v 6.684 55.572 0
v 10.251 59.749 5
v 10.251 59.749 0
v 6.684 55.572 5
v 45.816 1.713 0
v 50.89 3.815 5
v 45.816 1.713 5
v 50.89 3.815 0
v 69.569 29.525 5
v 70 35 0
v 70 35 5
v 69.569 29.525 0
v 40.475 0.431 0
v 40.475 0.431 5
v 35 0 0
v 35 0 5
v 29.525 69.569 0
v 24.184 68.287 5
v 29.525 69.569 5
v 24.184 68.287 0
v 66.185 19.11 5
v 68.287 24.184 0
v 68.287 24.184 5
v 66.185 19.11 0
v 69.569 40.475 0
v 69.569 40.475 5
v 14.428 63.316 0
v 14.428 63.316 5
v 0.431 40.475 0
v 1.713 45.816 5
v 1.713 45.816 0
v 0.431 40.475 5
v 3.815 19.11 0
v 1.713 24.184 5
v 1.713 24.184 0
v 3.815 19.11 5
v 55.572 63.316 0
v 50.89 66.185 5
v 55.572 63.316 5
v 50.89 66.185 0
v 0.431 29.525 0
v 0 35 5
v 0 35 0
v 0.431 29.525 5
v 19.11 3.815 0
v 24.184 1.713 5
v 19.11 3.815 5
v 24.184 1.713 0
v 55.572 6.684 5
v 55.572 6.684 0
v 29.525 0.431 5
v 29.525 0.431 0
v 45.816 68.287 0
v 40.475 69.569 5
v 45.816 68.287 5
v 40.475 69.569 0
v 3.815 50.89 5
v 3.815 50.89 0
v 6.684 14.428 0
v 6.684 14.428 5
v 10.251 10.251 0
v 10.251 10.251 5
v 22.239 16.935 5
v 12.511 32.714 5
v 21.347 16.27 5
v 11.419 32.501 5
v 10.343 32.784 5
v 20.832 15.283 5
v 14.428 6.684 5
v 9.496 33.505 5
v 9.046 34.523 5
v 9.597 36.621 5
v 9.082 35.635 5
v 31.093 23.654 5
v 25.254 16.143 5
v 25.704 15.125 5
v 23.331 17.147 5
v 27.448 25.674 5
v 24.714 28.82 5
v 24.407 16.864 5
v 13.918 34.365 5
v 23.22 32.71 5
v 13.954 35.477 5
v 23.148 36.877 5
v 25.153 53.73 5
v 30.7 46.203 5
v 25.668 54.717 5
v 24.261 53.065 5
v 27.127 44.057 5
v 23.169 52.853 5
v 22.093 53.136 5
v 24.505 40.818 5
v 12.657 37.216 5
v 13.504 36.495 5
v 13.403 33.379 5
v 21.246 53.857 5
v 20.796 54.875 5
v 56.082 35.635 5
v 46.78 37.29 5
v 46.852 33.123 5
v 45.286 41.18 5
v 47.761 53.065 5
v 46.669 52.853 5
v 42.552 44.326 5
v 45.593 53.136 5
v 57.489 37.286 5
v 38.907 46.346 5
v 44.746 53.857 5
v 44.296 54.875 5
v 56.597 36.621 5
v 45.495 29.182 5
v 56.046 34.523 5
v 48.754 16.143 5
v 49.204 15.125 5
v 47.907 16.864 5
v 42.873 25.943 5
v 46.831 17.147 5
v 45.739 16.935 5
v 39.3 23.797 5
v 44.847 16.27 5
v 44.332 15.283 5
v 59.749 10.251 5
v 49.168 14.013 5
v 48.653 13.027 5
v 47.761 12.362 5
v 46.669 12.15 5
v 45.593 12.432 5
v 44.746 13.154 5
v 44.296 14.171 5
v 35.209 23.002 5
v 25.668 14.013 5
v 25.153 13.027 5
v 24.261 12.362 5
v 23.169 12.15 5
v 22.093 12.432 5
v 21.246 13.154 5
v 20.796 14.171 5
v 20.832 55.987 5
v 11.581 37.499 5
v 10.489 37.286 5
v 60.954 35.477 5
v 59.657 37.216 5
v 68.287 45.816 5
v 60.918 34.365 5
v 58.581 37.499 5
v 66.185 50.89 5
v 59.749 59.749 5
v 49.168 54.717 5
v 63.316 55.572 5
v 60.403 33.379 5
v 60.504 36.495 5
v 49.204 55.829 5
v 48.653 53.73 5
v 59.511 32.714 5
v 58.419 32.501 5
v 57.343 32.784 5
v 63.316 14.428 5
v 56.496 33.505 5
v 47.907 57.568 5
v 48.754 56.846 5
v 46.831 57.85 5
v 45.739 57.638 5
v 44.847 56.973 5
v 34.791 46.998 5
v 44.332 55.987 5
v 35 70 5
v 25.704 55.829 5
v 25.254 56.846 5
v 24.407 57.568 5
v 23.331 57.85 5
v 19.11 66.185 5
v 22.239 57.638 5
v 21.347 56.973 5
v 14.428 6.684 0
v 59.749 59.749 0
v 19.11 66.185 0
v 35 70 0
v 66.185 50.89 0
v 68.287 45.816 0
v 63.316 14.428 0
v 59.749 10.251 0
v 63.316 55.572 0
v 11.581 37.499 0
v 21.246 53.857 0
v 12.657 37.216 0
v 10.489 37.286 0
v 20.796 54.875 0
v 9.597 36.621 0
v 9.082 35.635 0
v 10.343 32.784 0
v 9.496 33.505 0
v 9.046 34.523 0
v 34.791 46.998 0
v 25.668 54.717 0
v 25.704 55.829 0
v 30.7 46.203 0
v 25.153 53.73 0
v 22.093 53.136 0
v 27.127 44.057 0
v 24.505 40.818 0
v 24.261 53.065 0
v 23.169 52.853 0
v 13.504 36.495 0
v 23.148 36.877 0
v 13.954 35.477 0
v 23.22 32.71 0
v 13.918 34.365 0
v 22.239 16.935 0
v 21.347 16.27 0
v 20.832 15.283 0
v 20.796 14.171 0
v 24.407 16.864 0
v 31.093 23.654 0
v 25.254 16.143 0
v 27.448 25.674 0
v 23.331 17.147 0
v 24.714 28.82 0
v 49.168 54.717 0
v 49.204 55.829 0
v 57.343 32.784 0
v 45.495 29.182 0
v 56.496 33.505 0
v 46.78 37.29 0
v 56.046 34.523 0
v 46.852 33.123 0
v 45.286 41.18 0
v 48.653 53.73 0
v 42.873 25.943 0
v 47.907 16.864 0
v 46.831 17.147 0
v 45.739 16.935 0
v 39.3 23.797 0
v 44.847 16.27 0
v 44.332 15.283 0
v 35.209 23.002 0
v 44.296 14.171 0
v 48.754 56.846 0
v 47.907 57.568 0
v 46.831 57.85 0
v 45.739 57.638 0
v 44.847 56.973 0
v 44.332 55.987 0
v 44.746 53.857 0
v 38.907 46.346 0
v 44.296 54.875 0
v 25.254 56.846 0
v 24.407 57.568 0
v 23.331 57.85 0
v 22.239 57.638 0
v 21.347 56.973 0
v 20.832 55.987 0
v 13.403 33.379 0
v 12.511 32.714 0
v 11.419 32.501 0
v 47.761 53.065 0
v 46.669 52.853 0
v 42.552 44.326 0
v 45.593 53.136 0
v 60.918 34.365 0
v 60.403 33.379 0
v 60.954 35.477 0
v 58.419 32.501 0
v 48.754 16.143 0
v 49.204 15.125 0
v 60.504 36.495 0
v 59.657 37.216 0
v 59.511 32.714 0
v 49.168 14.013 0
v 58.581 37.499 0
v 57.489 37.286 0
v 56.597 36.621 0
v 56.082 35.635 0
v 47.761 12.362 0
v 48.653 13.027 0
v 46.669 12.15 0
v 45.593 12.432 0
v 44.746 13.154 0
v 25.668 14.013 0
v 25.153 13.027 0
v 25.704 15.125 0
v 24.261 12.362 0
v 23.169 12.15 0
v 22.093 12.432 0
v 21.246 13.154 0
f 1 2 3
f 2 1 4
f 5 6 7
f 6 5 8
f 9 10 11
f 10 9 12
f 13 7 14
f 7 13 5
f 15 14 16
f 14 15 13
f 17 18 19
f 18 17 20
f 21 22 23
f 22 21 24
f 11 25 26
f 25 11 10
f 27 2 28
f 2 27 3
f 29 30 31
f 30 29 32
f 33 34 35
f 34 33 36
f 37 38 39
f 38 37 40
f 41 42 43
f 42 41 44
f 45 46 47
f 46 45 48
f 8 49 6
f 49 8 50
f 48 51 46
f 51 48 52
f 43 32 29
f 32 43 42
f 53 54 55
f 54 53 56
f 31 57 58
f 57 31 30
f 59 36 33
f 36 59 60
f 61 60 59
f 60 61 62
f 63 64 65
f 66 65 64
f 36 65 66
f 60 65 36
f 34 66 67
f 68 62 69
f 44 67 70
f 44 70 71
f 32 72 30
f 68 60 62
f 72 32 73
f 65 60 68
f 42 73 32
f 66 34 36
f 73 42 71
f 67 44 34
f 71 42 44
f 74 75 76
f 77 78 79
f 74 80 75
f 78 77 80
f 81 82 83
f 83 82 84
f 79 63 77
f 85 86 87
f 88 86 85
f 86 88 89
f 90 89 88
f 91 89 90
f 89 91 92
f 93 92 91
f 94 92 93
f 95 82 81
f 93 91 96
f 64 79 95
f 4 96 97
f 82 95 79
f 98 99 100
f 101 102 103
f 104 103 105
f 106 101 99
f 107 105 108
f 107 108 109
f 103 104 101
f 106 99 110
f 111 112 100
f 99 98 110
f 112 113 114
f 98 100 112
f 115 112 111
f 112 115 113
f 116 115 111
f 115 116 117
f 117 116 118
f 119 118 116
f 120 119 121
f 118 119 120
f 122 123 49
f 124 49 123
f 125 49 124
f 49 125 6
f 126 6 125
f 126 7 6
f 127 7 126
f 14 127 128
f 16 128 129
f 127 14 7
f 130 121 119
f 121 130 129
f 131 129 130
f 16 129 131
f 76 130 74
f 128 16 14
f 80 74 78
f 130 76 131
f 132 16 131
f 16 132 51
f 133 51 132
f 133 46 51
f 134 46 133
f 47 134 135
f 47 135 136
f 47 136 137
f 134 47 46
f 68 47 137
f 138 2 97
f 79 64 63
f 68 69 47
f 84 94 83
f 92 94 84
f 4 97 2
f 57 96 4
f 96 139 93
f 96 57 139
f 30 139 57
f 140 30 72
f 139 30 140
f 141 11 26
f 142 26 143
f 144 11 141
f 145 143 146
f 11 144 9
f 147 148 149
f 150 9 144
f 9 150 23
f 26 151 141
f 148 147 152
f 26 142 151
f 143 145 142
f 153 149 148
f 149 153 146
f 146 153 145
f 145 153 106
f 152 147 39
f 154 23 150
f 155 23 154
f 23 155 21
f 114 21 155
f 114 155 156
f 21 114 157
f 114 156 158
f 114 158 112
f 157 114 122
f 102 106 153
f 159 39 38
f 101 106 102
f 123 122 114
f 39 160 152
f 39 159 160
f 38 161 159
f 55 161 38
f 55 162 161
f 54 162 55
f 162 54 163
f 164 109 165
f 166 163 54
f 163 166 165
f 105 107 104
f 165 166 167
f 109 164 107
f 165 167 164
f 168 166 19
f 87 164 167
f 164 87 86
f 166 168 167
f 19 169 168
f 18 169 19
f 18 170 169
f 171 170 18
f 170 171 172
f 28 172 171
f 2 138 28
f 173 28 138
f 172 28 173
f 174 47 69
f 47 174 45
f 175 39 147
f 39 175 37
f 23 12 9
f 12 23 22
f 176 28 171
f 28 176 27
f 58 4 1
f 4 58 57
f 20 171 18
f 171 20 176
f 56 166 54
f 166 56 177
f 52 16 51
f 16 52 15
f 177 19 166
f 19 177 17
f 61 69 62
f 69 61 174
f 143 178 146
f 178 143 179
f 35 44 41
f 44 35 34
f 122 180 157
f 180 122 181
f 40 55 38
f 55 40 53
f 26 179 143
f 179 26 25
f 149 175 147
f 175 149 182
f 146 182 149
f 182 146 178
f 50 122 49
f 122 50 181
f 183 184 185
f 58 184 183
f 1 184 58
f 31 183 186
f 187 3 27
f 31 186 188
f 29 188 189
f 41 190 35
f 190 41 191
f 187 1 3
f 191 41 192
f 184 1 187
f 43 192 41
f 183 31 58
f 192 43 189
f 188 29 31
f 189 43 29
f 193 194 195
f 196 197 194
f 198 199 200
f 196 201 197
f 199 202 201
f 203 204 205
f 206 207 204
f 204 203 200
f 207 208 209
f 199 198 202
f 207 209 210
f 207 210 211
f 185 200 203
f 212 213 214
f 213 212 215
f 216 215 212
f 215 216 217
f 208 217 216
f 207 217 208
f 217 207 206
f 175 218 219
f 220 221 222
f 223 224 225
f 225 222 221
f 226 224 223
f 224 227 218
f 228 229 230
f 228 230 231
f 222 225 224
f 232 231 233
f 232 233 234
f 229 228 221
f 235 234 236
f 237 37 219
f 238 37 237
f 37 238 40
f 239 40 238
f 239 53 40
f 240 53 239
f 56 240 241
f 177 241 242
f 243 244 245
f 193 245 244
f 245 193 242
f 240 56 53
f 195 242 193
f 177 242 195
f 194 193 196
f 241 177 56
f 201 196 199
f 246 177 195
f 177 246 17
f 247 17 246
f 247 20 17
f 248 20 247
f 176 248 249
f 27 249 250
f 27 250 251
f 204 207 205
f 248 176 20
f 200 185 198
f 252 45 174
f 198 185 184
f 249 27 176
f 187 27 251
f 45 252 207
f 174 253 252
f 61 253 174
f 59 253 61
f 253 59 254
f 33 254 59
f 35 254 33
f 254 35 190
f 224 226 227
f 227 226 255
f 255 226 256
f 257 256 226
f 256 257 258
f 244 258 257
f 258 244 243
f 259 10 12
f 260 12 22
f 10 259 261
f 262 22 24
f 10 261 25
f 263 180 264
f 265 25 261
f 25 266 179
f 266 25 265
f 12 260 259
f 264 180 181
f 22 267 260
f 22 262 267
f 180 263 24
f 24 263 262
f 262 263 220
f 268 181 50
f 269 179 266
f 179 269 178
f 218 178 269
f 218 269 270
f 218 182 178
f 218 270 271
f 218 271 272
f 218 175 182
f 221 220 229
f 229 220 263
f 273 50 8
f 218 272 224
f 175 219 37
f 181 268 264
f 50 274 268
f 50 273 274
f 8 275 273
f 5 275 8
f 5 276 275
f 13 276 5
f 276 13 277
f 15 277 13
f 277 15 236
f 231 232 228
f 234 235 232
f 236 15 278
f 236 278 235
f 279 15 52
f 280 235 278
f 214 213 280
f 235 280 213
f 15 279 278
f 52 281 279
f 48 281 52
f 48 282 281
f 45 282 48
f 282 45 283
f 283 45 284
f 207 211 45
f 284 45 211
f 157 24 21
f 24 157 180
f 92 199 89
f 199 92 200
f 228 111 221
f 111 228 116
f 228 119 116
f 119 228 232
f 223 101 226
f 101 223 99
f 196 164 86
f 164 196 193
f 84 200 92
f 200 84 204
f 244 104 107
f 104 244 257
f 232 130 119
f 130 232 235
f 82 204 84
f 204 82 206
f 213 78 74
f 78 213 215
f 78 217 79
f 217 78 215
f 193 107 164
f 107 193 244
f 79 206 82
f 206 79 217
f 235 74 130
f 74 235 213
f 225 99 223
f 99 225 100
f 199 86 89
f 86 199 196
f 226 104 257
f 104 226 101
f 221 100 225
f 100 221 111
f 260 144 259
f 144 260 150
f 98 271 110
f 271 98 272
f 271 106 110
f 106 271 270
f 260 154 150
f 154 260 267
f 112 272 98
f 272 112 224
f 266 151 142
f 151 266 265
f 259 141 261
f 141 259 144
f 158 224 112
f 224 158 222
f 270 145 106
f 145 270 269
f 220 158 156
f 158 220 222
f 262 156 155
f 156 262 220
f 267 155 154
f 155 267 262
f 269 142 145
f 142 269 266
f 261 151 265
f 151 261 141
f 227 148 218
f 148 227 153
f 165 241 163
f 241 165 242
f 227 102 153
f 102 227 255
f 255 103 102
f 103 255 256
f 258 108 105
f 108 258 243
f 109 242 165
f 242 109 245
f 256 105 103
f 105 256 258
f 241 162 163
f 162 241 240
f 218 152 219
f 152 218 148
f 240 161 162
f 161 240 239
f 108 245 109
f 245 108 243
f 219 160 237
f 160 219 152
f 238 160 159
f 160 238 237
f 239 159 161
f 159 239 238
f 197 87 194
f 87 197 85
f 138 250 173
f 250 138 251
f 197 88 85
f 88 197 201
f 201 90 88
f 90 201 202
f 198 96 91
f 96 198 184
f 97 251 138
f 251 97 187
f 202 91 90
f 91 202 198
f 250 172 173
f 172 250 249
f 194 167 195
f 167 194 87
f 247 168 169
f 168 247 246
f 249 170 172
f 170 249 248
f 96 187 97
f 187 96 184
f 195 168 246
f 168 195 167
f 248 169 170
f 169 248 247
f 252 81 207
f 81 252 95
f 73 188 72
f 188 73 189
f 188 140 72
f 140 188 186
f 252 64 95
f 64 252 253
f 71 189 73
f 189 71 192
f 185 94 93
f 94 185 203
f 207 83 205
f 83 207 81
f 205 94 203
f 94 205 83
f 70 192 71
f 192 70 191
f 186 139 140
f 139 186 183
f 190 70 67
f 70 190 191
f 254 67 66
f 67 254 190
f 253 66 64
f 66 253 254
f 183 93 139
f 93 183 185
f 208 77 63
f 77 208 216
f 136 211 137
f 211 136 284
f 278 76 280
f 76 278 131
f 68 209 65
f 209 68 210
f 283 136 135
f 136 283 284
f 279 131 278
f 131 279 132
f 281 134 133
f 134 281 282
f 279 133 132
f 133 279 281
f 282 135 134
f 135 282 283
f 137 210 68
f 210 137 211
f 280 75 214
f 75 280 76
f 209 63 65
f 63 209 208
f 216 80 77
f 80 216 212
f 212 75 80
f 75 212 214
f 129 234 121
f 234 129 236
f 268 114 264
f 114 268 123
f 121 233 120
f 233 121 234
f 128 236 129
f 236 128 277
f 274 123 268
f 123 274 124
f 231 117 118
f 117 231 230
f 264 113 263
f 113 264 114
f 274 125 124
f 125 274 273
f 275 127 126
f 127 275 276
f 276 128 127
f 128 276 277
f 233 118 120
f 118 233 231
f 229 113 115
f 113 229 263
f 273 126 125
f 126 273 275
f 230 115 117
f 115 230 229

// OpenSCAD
$fn = 32;

// ----------------------------------------------------------------------
// Spacer plate: round flange R35, 6 bolts
// ----------------------------------------------------------------------

// --- parameters (mm) ---
bore_r = 12;              // centre bore radius
bolt_r = 2.5;             // bolt hole radius
plate_t = 5;              // plate thickness, Z (extrusion height)
flange_r = 35;            // flange radius
n_bolt = 6;               // bolt hole count
ring_r = 23.5;            // bolt circle radius
fit_tol = 0.1;            // declared fit tolerance (prompt contract)
free_tol = 0.3;           // declared free tolerance (prompt contract)

profile = [[70, 35], [69.569, 40.475], [68.287, 45.816], [66.185, 50.89], [63.316, 55.572], [59.749, 59.749], [55.572, 63.316], [50.89, 66.185], [45.816, 68.287], [40.475, 69.569], [35, 70], [29.525, 69.569], [24.184, 68.287], [19.11, 66.185], [14.428, 63.316], [10.251, 59.749], [6.684, 55.572], [3.815, 50.89], [1.713, 45.816], [0.431, 40.475], [0, 35], [0.431, 29.525], [1.713, 24.184], [3.815, 19.11], [6.684, 14.428], [10.251, 10.251], [14.428, 6.684], [19.11, 3.815], [24.184, 1.713], [29.525, 0.431], [35, 0], [40.475, 0.431], [45.816, 1.713], [50.89, 3.815], [55.572, 6.684], [59.749, 10.251], [63.316, 14.428], [66.185, 19.11], [68.287, 24.184], [69.569, 29.525]];  // primary outline, 40 points, counter clockwise
void_1 = [[46.78, 37.29], [45.286, 41.18], [42.552, 44.326], [38.907, 46.346], [34.791, 46.998], [30.7, 46.203], [27.127, 44.057], [24.505, 40.818], [23.148, 36.877], [23.22, 32.71], [24.714, 28.82], [27.448, 25.674], [31.093, 23.654], [35.209, 23.002], [39.3, 23.797], [42.873, 25.943], [45.495, 29.182], [46.852, 33.123]];  // centre bore, 18 points
void_2 = [[60.954, 35.477], [60.504, 36.495], [59.657, 37.216], [58.581, 37.499], [57.489, 37.286], [56.597, 36.621], [56.082, 35.635], [56.046, 34.523], [56.496, 33.505], [57.343, 32.784], [58.419, 32.501], [59.511, 32.714], [60.403, 33.379], [60.918, 34.365]];  // bolt hole 1, 14 points
void_3 = [[49.204, 55.829], [48.754, 56.846], [47.907, 57.568], [46.831, 57.85], [45.739, 57.638], [44.847, 56.973], [44.332, 55.987], [44.296, 54.875], [44.746, 53.857], [45.593, 53.136], [46.669, 52.853], [47.761, 53.065], [48.653, 53.73], [49.168, 54.717]];  // bolt hole 2, 14 points
void_4 = [[25.704, 55.829], [25.254, 56.846], [24.407, 57.568], [23.331, 57.85], [22.239, 57.638], [21.347, 56.973], [20.832, 55.987], [20.796, 54.875], [21.246, 53.857], [22.093, 53.136], [23.169, 52.853], [24.261, 53.065], [25.153, 53.73], [25.668, 54.717]];  // bolt hole 3, 14 points
void_5 = [[13.954, 35.477], [13.504, 36.495], [12.657, 37.216], [11.581, 37.499], [10.489, 37.286], [9.597, 36.621], [9.082, 35.635], [9.046, 34.523], [9.496, 33.505], [10.343, 32.784], [11.419, 32.501], [12.511, 32.714], [13.403, 33.379], [13.918, 34.365]];  // bolt hole 4, 14 points
void_6 = [[25.704, 15.125], [25.254, 16.143], [24.407, 16.864], [23.331, 17.147], [22.239, 16.935], [21.347, 16.27], [20.832, 15.283], [20.796, 14.171], [21.246, 13.154], [22.093, 12.432], [23.169, 12.15], [24.261, 12.362], [25.153, 13.027], [25.668, 14.013]];  // bolt hole 5, 14 points
void_7 = [[49.204, 15.125], [48.754, 16.143], [47.907, 16.864], [46.831, 17.147], [45.739, 16.935], [44.847, 16.27], [44.332, 15.283], [44.296, 14.171], [44.746, 13.154], [45.593, 12.432], [46.669, 12.15], [47.761, 12.362], [48.653, 13.027], [49.168, 14.013]];  // bolt hole 6, 14 points

// --- the one profile operation ---
difference() {
  linear_extrude(height = plate_t) polygon(points = profile);
  translate([0, 0, -1])
    linear_extrude(height = plate_t + 2) polygon(points = void_1);
  translate([0, 0, -1])
    linear_extrude(height = plate_t + 2) polygon(points = void_2);
  translate([0, 0, -1])
    linear_extrude(height = plate_t + 2) polygon(points = void_3);
  translate([0, 0, -1])
    linear_extrude(height = plate_t + 2) polygon(points = void_4);
  translate([0, 0, -1])
    linear_extrude(height = plate_t + 2) polygon(points = void_5);
  translate([0, 0, -1])
    linear_extrude(height = plate_t + 2) polygon(points = void_6);
  translate([0, 0, -1])
    linear_extrude(height = plate_t + 2) polygon(points = void_7);
}
